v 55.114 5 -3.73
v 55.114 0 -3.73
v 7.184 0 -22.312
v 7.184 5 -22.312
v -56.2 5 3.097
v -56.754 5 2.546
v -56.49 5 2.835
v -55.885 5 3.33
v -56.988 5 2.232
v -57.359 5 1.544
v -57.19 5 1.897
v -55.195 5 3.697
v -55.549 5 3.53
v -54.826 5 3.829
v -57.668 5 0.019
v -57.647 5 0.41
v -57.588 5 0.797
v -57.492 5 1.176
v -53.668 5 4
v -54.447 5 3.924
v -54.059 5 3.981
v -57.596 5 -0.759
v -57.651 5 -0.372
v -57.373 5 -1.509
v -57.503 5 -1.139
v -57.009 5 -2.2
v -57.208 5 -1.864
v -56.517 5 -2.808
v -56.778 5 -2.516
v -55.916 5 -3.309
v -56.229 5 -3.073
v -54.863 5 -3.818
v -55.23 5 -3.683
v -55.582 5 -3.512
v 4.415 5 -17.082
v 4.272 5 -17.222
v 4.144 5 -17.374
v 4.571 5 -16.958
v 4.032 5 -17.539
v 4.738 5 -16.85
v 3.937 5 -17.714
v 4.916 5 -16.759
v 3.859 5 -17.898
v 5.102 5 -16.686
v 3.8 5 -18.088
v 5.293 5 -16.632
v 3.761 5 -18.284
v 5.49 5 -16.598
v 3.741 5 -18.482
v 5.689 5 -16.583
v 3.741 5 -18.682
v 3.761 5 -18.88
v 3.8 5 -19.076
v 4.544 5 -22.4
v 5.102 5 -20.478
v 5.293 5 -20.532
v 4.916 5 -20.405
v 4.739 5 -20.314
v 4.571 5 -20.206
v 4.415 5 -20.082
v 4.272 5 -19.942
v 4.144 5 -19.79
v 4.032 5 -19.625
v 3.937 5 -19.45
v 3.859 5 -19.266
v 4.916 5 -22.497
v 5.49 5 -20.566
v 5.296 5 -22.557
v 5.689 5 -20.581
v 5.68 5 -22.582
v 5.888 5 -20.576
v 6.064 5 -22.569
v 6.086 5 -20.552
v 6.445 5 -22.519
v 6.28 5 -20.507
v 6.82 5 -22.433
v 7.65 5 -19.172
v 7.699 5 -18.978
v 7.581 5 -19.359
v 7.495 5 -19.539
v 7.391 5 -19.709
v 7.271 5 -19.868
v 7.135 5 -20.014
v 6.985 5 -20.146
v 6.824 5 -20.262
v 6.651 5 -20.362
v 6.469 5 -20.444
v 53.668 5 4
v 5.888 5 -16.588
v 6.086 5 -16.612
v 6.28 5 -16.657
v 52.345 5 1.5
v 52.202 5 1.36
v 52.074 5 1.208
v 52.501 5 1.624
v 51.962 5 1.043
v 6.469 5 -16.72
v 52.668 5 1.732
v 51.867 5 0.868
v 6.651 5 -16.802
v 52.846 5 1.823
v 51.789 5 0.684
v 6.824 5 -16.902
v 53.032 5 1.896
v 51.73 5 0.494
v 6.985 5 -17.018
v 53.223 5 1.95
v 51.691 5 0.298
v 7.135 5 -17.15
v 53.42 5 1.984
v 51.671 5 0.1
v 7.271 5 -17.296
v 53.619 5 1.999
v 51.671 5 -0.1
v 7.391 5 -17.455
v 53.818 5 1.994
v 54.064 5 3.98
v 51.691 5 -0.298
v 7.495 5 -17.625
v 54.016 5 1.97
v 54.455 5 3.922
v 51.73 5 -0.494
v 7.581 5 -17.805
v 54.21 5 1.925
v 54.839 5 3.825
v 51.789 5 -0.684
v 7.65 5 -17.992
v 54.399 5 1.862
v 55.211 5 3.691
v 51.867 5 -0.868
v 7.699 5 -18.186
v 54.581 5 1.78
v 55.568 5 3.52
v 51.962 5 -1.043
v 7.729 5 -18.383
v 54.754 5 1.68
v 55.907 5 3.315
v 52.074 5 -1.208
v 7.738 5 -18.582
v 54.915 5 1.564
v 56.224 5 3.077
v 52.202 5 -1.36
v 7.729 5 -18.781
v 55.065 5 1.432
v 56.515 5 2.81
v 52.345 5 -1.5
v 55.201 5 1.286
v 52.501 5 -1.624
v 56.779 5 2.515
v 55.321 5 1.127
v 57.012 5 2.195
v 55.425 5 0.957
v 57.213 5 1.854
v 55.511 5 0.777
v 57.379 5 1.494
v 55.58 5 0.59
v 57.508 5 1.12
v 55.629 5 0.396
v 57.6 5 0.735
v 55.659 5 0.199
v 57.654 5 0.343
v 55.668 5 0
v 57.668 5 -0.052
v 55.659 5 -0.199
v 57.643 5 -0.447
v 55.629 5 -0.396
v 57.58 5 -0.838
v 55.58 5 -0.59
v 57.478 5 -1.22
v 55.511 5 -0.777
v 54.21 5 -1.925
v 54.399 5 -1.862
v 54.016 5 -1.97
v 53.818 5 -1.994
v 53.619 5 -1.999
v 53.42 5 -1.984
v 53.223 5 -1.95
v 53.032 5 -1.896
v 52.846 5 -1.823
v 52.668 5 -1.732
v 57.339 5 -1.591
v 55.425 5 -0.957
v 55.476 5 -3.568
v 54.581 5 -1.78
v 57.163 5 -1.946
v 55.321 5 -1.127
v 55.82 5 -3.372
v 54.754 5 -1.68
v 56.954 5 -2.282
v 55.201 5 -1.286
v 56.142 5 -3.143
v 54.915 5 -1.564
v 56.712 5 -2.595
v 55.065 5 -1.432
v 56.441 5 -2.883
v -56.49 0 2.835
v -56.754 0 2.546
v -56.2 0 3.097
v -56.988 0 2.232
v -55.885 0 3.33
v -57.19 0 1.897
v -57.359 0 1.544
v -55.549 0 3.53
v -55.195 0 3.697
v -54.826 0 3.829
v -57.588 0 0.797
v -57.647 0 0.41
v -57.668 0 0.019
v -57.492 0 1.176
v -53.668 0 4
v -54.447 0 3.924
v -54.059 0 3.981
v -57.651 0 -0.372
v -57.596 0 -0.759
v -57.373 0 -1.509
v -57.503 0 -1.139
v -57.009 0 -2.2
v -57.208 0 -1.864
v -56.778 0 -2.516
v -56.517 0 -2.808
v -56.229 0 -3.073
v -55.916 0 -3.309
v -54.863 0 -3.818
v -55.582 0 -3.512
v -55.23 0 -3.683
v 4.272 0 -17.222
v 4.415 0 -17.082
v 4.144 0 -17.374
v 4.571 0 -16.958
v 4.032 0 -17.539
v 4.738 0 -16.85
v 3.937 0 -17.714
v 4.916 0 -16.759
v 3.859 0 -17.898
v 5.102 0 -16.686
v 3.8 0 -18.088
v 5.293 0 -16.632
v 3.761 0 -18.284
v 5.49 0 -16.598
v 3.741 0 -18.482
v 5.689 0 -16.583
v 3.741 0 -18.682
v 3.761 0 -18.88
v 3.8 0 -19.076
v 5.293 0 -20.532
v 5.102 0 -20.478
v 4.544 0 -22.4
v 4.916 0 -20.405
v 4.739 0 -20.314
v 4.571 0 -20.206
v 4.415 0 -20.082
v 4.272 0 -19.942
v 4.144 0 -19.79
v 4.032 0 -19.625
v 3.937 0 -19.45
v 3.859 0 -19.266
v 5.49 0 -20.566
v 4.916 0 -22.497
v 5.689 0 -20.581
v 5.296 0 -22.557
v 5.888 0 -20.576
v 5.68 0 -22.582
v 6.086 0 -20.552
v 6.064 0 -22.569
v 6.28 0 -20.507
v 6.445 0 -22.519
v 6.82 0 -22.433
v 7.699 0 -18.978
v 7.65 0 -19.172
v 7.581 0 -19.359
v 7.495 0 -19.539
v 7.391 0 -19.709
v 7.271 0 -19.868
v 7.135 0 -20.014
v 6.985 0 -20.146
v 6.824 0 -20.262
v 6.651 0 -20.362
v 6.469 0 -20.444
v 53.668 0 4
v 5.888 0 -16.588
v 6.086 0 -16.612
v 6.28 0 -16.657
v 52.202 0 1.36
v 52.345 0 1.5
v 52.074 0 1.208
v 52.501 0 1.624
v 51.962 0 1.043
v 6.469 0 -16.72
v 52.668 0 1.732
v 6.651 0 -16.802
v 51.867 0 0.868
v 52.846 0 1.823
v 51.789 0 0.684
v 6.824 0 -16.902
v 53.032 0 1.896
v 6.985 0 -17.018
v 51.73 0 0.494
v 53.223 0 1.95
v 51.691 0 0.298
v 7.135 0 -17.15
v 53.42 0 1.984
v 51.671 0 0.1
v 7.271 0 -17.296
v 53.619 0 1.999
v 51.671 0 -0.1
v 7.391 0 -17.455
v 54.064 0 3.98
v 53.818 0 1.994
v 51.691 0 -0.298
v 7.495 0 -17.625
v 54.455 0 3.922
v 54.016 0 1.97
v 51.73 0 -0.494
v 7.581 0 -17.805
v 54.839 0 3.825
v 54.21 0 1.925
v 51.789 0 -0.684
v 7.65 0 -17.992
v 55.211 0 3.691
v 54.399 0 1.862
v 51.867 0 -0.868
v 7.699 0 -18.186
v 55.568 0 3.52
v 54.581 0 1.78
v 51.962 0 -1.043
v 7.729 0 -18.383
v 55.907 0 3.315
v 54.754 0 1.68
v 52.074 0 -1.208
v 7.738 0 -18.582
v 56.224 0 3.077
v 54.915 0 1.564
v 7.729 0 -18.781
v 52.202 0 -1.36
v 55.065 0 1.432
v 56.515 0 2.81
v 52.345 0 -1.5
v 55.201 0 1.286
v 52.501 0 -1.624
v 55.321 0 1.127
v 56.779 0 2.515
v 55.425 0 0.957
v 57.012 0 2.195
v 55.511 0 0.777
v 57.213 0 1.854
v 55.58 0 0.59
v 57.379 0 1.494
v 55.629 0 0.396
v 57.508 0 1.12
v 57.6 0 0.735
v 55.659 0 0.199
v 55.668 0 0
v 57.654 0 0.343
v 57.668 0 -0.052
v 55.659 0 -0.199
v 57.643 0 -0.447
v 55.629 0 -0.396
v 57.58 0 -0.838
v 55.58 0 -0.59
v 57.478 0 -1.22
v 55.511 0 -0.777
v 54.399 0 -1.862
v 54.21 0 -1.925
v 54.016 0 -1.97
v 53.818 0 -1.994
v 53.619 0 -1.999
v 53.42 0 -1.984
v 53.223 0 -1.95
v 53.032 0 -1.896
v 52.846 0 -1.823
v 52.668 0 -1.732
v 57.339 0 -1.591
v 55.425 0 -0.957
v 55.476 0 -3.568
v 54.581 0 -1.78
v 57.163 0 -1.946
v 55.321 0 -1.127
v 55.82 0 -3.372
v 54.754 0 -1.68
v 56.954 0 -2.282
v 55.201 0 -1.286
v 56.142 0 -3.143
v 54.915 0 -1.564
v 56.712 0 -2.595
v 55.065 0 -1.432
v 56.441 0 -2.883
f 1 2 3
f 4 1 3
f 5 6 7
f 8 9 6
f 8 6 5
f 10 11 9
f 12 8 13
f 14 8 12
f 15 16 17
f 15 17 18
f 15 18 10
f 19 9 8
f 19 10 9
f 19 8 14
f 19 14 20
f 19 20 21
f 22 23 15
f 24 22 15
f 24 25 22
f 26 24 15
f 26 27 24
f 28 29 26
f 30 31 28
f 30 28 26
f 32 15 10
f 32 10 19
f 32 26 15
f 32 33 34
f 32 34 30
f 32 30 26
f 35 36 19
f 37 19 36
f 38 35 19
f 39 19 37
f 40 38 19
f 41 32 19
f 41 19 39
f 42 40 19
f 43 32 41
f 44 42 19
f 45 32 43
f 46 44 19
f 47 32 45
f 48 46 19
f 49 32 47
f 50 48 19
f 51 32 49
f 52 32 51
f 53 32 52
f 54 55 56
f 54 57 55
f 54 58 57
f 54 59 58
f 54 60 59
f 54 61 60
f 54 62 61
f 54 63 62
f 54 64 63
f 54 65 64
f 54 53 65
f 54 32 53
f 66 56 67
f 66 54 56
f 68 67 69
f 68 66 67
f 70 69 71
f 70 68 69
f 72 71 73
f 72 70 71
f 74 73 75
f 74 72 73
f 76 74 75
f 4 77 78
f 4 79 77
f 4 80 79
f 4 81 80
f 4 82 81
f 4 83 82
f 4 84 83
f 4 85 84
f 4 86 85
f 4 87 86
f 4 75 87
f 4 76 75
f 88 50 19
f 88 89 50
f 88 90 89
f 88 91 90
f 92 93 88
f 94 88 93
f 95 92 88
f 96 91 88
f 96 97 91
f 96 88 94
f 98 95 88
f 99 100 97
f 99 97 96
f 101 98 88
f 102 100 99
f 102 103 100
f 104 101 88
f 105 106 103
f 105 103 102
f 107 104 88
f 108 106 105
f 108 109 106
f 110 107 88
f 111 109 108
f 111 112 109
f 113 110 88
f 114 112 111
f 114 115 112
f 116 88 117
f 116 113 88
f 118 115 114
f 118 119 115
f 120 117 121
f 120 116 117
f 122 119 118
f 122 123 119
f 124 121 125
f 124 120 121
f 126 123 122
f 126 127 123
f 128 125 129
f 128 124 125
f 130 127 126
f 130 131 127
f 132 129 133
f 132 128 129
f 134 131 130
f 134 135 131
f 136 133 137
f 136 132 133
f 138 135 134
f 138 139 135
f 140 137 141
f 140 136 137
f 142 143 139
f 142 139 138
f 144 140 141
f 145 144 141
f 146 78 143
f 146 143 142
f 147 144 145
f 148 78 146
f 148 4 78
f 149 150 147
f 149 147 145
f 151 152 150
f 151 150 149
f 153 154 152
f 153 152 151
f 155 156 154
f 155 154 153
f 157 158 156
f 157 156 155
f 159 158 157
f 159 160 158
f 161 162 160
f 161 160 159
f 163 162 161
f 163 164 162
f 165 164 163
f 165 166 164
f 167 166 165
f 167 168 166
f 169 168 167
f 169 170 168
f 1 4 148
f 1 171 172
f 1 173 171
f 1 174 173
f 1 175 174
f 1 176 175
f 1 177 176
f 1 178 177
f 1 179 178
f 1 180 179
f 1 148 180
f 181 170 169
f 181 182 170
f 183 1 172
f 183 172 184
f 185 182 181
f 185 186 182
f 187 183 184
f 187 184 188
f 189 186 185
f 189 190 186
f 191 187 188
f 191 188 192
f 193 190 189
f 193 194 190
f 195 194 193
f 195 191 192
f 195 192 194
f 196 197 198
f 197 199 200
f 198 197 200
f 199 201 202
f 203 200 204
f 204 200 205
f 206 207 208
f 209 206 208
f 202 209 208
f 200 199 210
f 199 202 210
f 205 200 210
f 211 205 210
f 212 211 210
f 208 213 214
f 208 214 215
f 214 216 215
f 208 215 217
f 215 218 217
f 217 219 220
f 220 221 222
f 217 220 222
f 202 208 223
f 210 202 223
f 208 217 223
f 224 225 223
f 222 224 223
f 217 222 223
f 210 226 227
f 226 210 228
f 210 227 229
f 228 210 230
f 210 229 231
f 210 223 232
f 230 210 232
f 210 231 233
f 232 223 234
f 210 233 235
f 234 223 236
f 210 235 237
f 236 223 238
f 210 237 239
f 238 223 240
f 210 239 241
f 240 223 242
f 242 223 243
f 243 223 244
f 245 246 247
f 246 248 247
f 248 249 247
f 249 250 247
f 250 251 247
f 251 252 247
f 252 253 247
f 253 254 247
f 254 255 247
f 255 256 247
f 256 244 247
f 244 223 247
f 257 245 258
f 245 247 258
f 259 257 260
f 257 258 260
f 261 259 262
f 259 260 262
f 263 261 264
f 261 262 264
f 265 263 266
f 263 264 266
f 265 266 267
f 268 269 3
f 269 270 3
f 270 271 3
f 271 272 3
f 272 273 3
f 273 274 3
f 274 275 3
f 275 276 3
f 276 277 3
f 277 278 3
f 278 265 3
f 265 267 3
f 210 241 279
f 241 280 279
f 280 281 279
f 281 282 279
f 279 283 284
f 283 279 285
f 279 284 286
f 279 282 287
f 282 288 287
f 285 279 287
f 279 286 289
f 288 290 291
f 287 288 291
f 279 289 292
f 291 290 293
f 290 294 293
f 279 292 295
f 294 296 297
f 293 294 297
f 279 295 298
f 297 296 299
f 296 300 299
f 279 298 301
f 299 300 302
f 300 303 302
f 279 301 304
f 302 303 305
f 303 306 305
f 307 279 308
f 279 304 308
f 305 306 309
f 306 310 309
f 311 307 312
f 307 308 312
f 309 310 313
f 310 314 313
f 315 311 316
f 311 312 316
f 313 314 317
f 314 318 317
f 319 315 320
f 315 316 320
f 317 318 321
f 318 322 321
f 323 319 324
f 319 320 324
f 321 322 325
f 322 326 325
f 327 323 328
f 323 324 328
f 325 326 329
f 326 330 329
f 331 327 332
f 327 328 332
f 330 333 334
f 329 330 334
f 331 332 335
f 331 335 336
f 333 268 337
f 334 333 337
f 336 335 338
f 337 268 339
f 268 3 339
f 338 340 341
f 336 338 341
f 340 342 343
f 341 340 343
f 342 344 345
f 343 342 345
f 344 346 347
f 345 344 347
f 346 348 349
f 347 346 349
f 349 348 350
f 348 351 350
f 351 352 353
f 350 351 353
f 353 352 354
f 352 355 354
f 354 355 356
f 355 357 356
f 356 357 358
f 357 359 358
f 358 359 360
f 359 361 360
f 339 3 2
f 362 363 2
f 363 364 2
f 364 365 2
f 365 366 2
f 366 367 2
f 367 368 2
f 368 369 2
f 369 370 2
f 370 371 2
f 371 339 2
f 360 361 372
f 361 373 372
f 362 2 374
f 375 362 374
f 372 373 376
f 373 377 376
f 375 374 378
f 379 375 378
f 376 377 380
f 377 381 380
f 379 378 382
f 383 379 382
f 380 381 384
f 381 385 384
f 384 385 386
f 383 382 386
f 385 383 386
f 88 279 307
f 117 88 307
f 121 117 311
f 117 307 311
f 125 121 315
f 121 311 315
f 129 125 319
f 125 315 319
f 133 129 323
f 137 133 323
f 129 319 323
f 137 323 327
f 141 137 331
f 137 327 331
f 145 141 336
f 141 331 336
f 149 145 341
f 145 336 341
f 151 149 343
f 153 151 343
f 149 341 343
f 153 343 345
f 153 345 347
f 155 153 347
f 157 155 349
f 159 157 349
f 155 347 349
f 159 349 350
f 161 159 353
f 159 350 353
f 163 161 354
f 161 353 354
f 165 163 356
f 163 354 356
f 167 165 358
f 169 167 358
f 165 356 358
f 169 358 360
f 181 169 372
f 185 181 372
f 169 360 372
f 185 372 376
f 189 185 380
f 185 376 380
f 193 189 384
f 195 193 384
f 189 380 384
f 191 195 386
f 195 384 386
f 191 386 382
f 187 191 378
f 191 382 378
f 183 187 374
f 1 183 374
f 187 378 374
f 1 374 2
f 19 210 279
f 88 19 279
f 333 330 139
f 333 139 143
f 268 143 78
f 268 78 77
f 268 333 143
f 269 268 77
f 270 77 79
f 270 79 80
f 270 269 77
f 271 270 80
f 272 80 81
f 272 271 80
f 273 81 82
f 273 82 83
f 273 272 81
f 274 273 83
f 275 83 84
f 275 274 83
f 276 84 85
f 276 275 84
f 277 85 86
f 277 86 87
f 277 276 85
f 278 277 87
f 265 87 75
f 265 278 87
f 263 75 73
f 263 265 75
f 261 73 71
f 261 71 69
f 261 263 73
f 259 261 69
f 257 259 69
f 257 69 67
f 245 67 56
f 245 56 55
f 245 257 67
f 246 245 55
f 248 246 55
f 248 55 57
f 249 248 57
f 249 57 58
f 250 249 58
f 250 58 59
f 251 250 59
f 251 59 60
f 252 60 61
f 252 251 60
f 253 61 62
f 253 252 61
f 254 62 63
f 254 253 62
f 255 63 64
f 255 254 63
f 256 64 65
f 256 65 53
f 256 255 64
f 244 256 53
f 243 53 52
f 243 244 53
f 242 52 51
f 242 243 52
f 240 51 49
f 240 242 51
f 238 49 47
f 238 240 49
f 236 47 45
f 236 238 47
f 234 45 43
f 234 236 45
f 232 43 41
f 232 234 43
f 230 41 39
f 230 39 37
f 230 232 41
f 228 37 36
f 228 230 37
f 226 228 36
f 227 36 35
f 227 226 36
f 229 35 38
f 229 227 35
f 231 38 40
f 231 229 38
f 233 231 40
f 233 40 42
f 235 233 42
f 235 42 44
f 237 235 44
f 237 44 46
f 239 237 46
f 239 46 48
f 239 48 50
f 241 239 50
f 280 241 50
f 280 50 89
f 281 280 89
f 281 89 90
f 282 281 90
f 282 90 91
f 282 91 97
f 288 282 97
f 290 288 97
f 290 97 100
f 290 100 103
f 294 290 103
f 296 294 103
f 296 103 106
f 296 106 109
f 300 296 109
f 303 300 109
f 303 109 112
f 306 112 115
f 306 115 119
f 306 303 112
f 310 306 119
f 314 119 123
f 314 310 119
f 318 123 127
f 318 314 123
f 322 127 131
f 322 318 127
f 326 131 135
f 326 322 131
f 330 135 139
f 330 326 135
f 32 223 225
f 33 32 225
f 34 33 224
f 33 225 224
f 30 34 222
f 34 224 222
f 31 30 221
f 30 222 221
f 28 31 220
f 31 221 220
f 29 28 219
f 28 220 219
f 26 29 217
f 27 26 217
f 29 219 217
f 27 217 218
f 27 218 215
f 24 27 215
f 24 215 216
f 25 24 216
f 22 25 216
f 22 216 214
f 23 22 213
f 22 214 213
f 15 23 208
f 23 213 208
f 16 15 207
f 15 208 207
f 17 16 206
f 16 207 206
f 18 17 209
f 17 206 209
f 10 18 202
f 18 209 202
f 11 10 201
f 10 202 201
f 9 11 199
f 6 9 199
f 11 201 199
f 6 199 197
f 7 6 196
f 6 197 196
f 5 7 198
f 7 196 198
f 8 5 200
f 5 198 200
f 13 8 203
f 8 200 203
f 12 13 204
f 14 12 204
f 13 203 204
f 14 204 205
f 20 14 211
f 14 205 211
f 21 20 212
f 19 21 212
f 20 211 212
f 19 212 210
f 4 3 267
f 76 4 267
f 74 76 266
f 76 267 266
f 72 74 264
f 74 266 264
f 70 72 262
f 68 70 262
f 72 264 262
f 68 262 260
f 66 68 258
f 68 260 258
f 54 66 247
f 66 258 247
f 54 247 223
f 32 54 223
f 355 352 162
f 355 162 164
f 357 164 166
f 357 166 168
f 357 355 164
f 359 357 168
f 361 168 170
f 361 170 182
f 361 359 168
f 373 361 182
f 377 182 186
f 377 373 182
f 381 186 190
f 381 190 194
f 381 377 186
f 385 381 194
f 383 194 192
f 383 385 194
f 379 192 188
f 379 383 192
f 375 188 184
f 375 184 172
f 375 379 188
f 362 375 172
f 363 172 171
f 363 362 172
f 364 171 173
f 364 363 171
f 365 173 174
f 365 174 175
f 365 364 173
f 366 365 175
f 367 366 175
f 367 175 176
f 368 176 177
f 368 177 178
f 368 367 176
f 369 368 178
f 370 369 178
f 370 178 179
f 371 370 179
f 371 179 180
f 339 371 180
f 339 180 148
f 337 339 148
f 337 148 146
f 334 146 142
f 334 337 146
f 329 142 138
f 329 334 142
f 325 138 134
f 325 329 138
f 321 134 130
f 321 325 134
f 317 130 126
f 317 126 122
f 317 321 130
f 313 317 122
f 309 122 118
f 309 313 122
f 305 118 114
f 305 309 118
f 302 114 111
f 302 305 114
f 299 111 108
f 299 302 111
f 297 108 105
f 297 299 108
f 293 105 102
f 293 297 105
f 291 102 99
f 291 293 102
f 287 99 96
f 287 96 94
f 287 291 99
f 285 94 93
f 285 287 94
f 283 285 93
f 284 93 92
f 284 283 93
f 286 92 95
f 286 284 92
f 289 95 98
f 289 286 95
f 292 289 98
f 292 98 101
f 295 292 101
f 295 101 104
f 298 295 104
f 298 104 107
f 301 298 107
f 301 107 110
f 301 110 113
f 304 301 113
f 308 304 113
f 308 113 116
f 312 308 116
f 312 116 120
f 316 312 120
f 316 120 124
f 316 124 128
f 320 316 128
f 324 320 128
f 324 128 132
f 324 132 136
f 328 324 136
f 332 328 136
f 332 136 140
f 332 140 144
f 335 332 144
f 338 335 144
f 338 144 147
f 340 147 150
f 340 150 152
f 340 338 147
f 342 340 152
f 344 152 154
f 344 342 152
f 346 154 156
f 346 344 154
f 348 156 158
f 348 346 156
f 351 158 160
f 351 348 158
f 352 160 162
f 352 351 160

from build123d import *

# Parameters (mm, degrees)
SKETCH_1_R      = 2
EXTRUDE_1_DEPTH = 5


with BuildPart() as part:
    # 草图1 → 凸台-拉伸1 (new body)
    with BuildSketch(Plane(origin=(0, 0, 0), x_dir=(1, 0, 0), z_dir=(0, 1, 0))):
        with BuildLine():
            ThreePointArc((-53.6685, 4), (-54.272481718, 3.954137843), (-54.862613484, 3.817603042))
            ThreePointArc((-54.862613484, 3.817603042), (-57.622637843, -0.603981718), (-53.6685, -4))
            ThreePointArc((-53.6685, -4), (-53.064518282, -3.954137843), (-52.474386516, -3.817603042))
            Line((-52.474386516, -3.817603042), (-27.481364025, 4))
            Line((-27.481364025, 4), (-53.6685, 4))
        make_face()
        with Locations((-53.6685, 0)):
            Circle(SKETCH_1_R, mode=Mode.SUBTRACT)
        with BuildLine():
            Line((4.544386516, 22.399603042), (-54.862613484, 3.817603042))
            ThreePointArc((-54.862613484, 3.817603042), (-54.272481718, 3.954137843), (-53.6685, 4))
            Line((-53.6685, 4), (-27.481364025, 4))
            Line((-27.481364025, 4), (5.597201207, 14.346691453))
            Line((5.597201207, 14.346691453), (4.292598412, 14.852473408))
            ThreePointArc((4.292598412, 14.852473408), (1.740724203, 18.715374202), (4.544386516, 22.399603042))
        make_face()
        with BuildLine():
            ThreePointArc((7.184401588, 22.311526592), (5.871874202, 22.579775797), (4.544386516, 22.399603042))
            ThreePointArc((4.544386516, 22.399603042), (1.740724203, 18.715374202), (4.292598412, 14.852473408))
            Line((4.292598412, 14.852473408), (5.597201207, 14.346691453))
            Line((5.597201207, 14.346691453), (6.932613484, 14.764396958))
            ThreePointArc((6.932613484, 14.764396958), (9.736275797, 18.448625798), (7.184401588, 22.311526592))
        make_face()
        with Locations((5.7385, 18.582)):
            Circle(SKETCH_1_R, mode=Mode.SUBTRACT)
        with BuildLine():
            Line((55.114401588, 3.729526592), (7.184401588, 22.311526592))
            ThreePointArc((7.184401588, 22.311526592), (9.736275797, 18.448625798), (6.932613484, 14.764396958))
            Line((6.932613484, 14.764396958), (5.597201207, 14.346691453))
            Line((5.597201207, 14.346691453), (32.285228401, 4))
            Line((32.285228401, 4), (53.6685, 4))
            ThreePointArc((53.6685, 4), (54.403990868, 3.931800247), (55.114401588, 3.729526592))
        make_face()
        with BuildLine():
            ThreePointArc((-52.474386516, -3.817603042), (-53.064518282, -3.954137843), (-53.6685, -4))
            Line((-53.6685, -4), (53.6685, -4))
            ThreePointArc((53.6685, -4), (52.933009132, -3.931800247), (52.222598412, -3.729526592))
            Line((52.222598412, -3.729526592), (32.285228401, 4))
            Line((32.285228401, 4), (-27.481364025, 4))
            Line((-27.481364025, 4), (-52.474386516, -3.817603042))
        make_face()
        with BuildLine():
            ThreePointArc((52.222598412, -3.729526592), (52.933009132, -3.931800247), (53.6685, -4))
            ThreePointArc((53.6685, -4), (57.600300247, -0.735490868), (55.114401588, 3.729526592))
            ThreePointArc((55.114401588, 3.729526592), (54.403990868, 3.931800247), (53.6685, 4))
            Line((53.6685, 4), (32.285228401, 4))
            Line((32.285228401, 4), (52.222598412, -3.729526592))
        make_face()
        with Locations((53.6685, 0)):
            Circle(SKETCH_1_R, mode=Mode.SUBTRACT)
        Polygon((5.597201207, 14.346691453), (-27.481364025, 4), (32.285228401, 4), align=None)
        with Locations((-53.6685, 0)):
            Circle(SKETCH_1_R)
    extrude(amount=EXTRUDE_1_DEPTH)


solid = part.part
